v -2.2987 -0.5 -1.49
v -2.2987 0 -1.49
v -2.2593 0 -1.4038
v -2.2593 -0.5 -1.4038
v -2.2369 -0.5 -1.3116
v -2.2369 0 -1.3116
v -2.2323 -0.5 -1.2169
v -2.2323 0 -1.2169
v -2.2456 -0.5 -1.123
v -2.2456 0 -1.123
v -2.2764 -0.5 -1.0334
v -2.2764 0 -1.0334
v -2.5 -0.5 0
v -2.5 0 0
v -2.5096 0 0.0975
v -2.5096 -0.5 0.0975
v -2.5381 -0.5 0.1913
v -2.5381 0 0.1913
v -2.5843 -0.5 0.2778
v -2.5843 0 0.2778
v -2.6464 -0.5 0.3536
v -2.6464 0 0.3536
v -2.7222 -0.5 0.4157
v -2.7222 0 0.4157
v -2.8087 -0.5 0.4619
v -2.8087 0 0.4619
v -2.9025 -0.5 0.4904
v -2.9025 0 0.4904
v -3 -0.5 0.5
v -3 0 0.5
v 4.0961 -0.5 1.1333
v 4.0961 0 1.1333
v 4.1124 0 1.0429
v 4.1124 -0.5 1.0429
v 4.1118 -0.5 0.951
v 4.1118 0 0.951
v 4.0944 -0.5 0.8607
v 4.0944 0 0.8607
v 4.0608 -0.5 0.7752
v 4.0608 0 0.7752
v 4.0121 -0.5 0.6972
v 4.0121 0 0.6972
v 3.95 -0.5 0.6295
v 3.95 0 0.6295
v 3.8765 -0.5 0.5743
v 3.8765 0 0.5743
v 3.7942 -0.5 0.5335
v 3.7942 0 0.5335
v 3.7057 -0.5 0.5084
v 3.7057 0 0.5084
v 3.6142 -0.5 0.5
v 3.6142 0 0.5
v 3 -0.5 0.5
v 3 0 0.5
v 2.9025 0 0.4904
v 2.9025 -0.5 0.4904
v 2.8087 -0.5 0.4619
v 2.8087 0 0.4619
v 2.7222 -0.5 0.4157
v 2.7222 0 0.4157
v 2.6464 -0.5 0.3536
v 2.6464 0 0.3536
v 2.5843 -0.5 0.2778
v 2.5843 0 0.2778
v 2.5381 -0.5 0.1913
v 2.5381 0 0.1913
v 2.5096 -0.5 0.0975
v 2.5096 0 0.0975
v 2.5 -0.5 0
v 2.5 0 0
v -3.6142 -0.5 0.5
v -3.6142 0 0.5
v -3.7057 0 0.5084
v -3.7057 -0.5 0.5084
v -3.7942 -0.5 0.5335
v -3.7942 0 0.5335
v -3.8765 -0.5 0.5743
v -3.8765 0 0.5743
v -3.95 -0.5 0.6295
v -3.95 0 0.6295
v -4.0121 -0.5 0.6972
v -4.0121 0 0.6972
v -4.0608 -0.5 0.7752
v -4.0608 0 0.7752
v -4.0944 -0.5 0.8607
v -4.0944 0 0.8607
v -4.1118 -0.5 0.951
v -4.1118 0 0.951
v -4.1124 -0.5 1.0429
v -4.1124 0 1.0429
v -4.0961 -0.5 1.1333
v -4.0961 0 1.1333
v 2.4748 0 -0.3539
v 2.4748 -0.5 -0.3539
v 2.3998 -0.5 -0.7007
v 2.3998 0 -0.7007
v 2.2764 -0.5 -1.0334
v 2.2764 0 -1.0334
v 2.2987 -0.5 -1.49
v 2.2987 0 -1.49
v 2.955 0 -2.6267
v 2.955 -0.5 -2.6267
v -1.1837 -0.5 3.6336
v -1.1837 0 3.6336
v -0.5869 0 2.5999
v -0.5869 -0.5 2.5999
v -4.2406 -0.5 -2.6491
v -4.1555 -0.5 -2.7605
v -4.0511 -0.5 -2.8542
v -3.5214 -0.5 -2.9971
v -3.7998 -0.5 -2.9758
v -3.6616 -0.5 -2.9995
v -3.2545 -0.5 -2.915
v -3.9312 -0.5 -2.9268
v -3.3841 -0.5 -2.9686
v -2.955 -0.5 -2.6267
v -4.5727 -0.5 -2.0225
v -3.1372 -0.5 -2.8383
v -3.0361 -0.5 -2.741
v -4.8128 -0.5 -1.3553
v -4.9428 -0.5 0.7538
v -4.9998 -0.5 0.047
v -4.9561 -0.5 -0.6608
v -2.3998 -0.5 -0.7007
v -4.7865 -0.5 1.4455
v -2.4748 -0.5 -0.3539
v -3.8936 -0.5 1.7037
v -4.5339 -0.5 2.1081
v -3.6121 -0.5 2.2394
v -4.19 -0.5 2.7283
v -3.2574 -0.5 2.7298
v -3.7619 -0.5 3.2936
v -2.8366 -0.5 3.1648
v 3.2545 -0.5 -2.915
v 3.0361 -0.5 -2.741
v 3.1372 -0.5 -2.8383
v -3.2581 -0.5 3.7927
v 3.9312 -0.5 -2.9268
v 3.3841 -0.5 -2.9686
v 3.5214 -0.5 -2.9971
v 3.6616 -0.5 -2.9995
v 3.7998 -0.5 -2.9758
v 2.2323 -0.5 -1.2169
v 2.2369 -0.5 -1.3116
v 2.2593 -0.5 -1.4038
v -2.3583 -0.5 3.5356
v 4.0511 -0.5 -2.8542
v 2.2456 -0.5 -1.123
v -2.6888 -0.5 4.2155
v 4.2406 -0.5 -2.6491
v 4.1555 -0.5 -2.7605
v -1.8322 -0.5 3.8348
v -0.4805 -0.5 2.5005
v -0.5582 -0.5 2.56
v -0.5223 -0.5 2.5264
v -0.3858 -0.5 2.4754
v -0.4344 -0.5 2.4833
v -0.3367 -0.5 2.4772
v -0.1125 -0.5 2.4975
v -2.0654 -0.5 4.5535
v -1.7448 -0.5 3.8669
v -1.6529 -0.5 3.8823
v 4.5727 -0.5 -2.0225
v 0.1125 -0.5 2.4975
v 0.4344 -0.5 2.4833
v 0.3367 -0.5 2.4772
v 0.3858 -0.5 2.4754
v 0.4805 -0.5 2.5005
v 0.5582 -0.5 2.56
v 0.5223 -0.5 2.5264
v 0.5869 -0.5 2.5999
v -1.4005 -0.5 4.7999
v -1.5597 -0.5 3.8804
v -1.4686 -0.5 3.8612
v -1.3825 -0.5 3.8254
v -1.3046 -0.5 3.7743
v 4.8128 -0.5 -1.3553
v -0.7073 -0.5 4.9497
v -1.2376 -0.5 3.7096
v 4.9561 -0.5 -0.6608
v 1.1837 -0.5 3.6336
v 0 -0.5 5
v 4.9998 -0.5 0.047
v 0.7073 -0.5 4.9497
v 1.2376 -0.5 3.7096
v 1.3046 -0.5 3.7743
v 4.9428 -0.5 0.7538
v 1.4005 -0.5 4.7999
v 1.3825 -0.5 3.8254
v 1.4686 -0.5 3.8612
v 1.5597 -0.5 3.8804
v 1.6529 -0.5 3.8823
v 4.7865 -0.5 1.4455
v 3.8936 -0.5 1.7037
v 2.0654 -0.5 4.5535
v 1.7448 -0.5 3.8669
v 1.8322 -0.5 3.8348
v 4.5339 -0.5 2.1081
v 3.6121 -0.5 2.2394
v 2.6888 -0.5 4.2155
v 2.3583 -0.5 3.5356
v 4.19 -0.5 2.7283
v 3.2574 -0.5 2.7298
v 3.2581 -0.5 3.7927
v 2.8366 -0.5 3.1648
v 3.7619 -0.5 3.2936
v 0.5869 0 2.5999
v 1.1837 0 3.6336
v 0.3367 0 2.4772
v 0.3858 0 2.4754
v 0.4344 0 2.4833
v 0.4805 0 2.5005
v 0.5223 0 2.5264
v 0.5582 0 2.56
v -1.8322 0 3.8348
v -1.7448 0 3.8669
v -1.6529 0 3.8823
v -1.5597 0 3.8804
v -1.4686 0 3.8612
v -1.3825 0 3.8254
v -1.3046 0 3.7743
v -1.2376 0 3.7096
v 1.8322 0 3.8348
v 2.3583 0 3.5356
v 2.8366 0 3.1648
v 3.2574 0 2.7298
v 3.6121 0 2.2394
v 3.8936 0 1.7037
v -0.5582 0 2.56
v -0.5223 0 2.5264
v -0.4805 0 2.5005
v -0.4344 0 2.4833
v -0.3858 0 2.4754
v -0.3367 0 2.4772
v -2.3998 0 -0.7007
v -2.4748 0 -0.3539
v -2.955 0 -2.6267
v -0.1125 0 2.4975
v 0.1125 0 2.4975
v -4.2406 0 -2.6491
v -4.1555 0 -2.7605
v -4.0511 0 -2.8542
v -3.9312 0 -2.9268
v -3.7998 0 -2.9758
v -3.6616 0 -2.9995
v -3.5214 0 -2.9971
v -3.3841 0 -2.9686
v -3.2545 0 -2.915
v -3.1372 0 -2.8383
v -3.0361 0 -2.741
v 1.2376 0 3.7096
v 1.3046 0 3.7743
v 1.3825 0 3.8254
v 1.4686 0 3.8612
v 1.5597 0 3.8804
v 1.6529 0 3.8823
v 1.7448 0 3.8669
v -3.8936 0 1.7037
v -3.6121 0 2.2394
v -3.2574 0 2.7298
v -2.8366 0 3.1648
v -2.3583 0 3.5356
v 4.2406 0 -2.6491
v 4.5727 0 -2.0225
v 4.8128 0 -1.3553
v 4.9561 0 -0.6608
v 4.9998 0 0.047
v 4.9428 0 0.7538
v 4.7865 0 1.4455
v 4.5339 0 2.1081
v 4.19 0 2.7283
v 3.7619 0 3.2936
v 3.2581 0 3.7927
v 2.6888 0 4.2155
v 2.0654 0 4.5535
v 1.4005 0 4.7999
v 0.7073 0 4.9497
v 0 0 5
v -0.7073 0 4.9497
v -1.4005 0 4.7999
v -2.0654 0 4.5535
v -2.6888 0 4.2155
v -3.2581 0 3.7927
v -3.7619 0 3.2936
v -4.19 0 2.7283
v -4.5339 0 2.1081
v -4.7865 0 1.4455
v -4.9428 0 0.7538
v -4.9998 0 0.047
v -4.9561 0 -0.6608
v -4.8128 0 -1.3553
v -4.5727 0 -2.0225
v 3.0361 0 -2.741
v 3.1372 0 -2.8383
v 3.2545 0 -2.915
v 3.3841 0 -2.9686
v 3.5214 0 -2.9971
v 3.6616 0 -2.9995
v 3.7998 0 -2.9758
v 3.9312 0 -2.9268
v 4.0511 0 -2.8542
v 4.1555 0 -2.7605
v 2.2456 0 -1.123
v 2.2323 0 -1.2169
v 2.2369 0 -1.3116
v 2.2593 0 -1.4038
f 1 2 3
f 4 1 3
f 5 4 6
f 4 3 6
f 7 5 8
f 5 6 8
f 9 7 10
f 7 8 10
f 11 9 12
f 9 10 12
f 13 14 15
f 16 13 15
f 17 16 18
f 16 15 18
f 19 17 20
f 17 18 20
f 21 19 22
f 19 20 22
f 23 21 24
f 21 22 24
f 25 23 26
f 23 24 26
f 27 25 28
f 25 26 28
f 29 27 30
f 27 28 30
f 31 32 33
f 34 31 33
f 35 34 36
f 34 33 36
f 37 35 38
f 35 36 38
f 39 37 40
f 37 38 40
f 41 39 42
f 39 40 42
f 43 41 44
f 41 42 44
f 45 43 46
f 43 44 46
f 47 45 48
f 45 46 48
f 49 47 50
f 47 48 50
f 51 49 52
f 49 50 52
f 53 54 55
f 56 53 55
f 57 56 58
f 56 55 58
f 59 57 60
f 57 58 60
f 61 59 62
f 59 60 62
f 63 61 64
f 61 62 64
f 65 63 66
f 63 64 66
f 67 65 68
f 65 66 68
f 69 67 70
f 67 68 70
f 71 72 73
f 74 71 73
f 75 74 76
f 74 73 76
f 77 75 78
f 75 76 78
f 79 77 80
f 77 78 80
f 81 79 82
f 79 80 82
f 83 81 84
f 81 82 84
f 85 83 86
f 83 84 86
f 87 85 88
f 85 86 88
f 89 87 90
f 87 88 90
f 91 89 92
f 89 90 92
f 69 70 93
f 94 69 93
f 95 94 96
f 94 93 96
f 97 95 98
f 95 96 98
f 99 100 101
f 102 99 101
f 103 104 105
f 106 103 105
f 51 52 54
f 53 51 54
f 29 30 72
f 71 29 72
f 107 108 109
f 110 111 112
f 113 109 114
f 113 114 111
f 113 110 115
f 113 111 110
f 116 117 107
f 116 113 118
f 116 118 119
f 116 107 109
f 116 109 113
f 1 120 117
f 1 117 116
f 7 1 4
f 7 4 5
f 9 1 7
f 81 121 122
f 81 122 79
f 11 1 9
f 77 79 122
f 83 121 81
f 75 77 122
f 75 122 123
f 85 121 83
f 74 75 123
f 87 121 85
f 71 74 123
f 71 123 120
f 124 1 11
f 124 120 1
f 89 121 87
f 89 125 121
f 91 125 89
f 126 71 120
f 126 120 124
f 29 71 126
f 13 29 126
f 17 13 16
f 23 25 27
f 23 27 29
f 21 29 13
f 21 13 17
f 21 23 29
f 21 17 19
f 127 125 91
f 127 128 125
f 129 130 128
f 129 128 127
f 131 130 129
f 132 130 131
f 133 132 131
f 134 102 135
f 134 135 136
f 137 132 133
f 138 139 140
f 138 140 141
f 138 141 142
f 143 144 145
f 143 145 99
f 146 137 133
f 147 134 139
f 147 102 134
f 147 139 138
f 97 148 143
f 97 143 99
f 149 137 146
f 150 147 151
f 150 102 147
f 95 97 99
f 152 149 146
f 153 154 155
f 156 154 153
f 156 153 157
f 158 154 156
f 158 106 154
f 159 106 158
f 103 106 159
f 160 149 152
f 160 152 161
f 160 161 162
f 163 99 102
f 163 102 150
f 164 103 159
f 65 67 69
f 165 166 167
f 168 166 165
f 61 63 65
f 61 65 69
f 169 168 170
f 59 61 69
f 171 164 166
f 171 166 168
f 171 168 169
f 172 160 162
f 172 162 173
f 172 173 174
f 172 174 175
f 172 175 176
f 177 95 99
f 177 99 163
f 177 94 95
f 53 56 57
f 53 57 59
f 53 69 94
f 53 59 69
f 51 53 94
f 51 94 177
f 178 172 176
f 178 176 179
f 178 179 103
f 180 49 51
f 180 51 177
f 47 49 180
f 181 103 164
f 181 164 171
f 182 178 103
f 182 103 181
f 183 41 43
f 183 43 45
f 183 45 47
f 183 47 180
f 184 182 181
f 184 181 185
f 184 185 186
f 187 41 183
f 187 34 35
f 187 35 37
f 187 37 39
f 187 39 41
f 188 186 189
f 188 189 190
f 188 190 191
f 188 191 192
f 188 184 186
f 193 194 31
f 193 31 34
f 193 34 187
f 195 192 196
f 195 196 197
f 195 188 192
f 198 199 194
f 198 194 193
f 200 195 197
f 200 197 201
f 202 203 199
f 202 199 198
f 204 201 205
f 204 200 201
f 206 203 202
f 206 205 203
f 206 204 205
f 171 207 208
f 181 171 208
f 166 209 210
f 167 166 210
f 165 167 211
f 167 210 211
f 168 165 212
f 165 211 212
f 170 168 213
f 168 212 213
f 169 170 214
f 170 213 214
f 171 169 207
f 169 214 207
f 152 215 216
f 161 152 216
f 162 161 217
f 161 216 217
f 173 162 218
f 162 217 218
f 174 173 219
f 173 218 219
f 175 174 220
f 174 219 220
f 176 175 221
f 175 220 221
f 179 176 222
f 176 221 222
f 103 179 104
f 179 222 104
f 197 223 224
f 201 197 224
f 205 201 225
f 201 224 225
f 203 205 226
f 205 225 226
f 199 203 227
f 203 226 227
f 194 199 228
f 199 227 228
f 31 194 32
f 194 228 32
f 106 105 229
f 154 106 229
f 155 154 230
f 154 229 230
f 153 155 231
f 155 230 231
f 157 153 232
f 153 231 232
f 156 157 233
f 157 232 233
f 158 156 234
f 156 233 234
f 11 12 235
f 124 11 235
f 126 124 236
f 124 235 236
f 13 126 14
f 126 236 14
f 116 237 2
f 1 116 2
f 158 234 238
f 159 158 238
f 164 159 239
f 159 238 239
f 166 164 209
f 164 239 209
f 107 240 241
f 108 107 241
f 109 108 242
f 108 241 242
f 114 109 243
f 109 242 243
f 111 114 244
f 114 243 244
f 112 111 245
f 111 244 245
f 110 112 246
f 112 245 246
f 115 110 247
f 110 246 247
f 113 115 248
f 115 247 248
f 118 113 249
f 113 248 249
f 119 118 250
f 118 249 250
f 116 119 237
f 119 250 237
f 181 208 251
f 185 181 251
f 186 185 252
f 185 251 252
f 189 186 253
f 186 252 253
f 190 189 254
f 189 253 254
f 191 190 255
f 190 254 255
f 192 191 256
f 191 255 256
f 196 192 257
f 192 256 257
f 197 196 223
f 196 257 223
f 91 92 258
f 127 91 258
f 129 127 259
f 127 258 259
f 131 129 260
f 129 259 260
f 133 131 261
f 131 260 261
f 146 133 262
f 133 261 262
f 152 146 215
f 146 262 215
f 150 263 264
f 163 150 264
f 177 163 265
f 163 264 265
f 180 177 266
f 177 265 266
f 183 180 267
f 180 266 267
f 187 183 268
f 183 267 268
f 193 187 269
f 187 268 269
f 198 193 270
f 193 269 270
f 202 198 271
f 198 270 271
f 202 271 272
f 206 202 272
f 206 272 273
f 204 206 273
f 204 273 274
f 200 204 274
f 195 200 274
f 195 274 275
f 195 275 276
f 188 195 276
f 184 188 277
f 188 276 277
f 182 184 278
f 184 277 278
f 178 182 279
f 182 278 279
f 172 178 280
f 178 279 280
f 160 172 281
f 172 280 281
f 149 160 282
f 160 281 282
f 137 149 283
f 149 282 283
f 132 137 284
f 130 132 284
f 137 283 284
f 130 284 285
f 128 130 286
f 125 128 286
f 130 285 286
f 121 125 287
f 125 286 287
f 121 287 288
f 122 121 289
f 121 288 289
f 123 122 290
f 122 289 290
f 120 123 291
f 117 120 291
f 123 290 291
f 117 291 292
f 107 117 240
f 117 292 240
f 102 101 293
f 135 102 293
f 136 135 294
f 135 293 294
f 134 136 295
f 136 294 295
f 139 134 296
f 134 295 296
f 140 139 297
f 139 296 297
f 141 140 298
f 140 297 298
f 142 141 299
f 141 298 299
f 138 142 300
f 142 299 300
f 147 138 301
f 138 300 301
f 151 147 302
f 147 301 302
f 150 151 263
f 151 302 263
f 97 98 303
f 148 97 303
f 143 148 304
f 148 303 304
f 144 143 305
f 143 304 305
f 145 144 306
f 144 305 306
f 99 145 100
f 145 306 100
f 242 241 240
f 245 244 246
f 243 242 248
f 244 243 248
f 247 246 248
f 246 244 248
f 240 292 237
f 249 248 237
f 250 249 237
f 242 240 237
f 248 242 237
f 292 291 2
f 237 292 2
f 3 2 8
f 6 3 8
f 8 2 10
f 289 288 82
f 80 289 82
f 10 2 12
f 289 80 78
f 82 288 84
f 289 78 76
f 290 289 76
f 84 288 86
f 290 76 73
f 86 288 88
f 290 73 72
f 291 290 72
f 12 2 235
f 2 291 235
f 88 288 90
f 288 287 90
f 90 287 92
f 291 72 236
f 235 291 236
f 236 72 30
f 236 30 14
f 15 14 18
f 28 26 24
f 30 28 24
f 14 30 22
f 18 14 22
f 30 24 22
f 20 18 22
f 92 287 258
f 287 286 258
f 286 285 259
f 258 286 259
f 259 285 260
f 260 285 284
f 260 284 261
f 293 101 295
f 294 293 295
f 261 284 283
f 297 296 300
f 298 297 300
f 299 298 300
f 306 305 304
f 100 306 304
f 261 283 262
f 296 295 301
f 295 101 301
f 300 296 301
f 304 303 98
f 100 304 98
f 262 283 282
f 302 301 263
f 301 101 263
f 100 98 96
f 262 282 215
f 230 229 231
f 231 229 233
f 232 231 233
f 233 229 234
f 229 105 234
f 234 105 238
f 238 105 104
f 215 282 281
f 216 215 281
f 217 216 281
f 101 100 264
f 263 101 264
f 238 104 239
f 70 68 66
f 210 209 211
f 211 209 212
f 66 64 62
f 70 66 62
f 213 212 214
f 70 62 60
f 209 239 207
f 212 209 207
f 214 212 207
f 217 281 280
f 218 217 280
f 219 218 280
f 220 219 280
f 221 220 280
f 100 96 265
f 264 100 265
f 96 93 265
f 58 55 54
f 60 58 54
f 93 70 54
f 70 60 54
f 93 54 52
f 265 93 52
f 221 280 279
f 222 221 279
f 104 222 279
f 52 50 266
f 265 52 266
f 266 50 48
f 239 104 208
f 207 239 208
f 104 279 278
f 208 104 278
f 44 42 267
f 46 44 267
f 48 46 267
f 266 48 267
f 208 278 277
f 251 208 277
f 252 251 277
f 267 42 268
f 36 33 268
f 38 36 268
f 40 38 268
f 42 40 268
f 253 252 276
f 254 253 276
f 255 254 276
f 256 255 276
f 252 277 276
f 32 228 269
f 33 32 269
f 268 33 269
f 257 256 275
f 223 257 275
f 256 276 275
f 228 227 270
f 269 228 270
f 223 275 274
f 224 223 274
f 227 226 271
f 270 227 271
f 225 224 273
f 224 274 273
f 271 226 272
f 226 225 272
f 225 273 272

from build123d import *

# Parameters (mm, degrees)
F1_DEPTH = 0.5


with BuildPart() as f1:
    # F0 (on Front) → F1 (new body)
    with BuildSketch(Plane.XZ):
        with BuildLine():
            ThreePointArc((2.954972, -2.626698), (3.591449, -3.001585), (4.240578, -2.649057))
            ThreePointArc((4.240578, -2.649057), (0, 5), (-4.240578, -2.649057))
            ThreePointArc((-4.240578, -2.649057), (-3.591449, -3.001585), (-2.954972, -2.626698))
            Line((-2.954972, -2.626698), (-2.298715, -1.490027))
            ThreePointArc((-2.298715, -1.490027), (-2.232321, -1.264386), (-2.276439, -1.033356))
            ThreePointArc((-2.276439, -1.033356), (-2.443471, -0.528631), (-2.5, 0))
            ThreePointArc((-2.5, 0), (-2.646447, 0.353553), (-3, 0.5))
            Line((-3, 0.5), (-3.614208, 0.5))
            ThreePointArc((-3.614208, 0.5), (-4.012119, 0.697235), (-4.096102, 1.133333))
            ThreePointArc((-4.096102, 1.133333), (-3.257408, 2.729797), (-1.832226, 3.834768))
            ThreePointArc((-1.832226, 3.834768), (-1.468558, 3.861178), (-1.183657, 3.633619))
            Line((-1.183657, 3.633619), (-0.586866, 2.599947))
            ThreePointArc((-0.586866, 2.599947), (-0.480462, 2.500497), (-0.336691, 2.477224))
            ThreePointArc((-0.336691, 2.477224), (0, 2.5), (0.336691, 2.477224))
            ThreePointArc((0.336691, 2.477224), (0.480462, 2.500497), (0.586866, 2.599947))
            Line((0.586866, 2.599947), (1.183657, 3.633619))
            ThreePointArc((1.183657, 3.633619), (1.468558, 3.861178), (1.832226, 3.834768))
            ThreePointArc((1.832226, 3.834768), (3.257408, 2.729797), (4.096102, 1.133333))
            ThreePointArc((4.096102, 1.133333), (4.012119, 0.697235), (3.614208, 0.5))
            Line((3.614208, 0.5), (3, 0.5))
            ThreePointArc((3, 0.5), (2.646447, 0.353553), (2.5, 0))
            ThreePointArc((2.5, 0), (2.443471, -0.528631), (2.276439, -1.033356))
            ThreePointArc((2.276439, -1.033356), (2.232321, -1.264386), (2.298715, -1.490027))
            Line((2.298715, -1.490027), (2.954972, -2.626698))
        make_face()
    extrude(amount=F1_DEPTH)


solid = f1.part
